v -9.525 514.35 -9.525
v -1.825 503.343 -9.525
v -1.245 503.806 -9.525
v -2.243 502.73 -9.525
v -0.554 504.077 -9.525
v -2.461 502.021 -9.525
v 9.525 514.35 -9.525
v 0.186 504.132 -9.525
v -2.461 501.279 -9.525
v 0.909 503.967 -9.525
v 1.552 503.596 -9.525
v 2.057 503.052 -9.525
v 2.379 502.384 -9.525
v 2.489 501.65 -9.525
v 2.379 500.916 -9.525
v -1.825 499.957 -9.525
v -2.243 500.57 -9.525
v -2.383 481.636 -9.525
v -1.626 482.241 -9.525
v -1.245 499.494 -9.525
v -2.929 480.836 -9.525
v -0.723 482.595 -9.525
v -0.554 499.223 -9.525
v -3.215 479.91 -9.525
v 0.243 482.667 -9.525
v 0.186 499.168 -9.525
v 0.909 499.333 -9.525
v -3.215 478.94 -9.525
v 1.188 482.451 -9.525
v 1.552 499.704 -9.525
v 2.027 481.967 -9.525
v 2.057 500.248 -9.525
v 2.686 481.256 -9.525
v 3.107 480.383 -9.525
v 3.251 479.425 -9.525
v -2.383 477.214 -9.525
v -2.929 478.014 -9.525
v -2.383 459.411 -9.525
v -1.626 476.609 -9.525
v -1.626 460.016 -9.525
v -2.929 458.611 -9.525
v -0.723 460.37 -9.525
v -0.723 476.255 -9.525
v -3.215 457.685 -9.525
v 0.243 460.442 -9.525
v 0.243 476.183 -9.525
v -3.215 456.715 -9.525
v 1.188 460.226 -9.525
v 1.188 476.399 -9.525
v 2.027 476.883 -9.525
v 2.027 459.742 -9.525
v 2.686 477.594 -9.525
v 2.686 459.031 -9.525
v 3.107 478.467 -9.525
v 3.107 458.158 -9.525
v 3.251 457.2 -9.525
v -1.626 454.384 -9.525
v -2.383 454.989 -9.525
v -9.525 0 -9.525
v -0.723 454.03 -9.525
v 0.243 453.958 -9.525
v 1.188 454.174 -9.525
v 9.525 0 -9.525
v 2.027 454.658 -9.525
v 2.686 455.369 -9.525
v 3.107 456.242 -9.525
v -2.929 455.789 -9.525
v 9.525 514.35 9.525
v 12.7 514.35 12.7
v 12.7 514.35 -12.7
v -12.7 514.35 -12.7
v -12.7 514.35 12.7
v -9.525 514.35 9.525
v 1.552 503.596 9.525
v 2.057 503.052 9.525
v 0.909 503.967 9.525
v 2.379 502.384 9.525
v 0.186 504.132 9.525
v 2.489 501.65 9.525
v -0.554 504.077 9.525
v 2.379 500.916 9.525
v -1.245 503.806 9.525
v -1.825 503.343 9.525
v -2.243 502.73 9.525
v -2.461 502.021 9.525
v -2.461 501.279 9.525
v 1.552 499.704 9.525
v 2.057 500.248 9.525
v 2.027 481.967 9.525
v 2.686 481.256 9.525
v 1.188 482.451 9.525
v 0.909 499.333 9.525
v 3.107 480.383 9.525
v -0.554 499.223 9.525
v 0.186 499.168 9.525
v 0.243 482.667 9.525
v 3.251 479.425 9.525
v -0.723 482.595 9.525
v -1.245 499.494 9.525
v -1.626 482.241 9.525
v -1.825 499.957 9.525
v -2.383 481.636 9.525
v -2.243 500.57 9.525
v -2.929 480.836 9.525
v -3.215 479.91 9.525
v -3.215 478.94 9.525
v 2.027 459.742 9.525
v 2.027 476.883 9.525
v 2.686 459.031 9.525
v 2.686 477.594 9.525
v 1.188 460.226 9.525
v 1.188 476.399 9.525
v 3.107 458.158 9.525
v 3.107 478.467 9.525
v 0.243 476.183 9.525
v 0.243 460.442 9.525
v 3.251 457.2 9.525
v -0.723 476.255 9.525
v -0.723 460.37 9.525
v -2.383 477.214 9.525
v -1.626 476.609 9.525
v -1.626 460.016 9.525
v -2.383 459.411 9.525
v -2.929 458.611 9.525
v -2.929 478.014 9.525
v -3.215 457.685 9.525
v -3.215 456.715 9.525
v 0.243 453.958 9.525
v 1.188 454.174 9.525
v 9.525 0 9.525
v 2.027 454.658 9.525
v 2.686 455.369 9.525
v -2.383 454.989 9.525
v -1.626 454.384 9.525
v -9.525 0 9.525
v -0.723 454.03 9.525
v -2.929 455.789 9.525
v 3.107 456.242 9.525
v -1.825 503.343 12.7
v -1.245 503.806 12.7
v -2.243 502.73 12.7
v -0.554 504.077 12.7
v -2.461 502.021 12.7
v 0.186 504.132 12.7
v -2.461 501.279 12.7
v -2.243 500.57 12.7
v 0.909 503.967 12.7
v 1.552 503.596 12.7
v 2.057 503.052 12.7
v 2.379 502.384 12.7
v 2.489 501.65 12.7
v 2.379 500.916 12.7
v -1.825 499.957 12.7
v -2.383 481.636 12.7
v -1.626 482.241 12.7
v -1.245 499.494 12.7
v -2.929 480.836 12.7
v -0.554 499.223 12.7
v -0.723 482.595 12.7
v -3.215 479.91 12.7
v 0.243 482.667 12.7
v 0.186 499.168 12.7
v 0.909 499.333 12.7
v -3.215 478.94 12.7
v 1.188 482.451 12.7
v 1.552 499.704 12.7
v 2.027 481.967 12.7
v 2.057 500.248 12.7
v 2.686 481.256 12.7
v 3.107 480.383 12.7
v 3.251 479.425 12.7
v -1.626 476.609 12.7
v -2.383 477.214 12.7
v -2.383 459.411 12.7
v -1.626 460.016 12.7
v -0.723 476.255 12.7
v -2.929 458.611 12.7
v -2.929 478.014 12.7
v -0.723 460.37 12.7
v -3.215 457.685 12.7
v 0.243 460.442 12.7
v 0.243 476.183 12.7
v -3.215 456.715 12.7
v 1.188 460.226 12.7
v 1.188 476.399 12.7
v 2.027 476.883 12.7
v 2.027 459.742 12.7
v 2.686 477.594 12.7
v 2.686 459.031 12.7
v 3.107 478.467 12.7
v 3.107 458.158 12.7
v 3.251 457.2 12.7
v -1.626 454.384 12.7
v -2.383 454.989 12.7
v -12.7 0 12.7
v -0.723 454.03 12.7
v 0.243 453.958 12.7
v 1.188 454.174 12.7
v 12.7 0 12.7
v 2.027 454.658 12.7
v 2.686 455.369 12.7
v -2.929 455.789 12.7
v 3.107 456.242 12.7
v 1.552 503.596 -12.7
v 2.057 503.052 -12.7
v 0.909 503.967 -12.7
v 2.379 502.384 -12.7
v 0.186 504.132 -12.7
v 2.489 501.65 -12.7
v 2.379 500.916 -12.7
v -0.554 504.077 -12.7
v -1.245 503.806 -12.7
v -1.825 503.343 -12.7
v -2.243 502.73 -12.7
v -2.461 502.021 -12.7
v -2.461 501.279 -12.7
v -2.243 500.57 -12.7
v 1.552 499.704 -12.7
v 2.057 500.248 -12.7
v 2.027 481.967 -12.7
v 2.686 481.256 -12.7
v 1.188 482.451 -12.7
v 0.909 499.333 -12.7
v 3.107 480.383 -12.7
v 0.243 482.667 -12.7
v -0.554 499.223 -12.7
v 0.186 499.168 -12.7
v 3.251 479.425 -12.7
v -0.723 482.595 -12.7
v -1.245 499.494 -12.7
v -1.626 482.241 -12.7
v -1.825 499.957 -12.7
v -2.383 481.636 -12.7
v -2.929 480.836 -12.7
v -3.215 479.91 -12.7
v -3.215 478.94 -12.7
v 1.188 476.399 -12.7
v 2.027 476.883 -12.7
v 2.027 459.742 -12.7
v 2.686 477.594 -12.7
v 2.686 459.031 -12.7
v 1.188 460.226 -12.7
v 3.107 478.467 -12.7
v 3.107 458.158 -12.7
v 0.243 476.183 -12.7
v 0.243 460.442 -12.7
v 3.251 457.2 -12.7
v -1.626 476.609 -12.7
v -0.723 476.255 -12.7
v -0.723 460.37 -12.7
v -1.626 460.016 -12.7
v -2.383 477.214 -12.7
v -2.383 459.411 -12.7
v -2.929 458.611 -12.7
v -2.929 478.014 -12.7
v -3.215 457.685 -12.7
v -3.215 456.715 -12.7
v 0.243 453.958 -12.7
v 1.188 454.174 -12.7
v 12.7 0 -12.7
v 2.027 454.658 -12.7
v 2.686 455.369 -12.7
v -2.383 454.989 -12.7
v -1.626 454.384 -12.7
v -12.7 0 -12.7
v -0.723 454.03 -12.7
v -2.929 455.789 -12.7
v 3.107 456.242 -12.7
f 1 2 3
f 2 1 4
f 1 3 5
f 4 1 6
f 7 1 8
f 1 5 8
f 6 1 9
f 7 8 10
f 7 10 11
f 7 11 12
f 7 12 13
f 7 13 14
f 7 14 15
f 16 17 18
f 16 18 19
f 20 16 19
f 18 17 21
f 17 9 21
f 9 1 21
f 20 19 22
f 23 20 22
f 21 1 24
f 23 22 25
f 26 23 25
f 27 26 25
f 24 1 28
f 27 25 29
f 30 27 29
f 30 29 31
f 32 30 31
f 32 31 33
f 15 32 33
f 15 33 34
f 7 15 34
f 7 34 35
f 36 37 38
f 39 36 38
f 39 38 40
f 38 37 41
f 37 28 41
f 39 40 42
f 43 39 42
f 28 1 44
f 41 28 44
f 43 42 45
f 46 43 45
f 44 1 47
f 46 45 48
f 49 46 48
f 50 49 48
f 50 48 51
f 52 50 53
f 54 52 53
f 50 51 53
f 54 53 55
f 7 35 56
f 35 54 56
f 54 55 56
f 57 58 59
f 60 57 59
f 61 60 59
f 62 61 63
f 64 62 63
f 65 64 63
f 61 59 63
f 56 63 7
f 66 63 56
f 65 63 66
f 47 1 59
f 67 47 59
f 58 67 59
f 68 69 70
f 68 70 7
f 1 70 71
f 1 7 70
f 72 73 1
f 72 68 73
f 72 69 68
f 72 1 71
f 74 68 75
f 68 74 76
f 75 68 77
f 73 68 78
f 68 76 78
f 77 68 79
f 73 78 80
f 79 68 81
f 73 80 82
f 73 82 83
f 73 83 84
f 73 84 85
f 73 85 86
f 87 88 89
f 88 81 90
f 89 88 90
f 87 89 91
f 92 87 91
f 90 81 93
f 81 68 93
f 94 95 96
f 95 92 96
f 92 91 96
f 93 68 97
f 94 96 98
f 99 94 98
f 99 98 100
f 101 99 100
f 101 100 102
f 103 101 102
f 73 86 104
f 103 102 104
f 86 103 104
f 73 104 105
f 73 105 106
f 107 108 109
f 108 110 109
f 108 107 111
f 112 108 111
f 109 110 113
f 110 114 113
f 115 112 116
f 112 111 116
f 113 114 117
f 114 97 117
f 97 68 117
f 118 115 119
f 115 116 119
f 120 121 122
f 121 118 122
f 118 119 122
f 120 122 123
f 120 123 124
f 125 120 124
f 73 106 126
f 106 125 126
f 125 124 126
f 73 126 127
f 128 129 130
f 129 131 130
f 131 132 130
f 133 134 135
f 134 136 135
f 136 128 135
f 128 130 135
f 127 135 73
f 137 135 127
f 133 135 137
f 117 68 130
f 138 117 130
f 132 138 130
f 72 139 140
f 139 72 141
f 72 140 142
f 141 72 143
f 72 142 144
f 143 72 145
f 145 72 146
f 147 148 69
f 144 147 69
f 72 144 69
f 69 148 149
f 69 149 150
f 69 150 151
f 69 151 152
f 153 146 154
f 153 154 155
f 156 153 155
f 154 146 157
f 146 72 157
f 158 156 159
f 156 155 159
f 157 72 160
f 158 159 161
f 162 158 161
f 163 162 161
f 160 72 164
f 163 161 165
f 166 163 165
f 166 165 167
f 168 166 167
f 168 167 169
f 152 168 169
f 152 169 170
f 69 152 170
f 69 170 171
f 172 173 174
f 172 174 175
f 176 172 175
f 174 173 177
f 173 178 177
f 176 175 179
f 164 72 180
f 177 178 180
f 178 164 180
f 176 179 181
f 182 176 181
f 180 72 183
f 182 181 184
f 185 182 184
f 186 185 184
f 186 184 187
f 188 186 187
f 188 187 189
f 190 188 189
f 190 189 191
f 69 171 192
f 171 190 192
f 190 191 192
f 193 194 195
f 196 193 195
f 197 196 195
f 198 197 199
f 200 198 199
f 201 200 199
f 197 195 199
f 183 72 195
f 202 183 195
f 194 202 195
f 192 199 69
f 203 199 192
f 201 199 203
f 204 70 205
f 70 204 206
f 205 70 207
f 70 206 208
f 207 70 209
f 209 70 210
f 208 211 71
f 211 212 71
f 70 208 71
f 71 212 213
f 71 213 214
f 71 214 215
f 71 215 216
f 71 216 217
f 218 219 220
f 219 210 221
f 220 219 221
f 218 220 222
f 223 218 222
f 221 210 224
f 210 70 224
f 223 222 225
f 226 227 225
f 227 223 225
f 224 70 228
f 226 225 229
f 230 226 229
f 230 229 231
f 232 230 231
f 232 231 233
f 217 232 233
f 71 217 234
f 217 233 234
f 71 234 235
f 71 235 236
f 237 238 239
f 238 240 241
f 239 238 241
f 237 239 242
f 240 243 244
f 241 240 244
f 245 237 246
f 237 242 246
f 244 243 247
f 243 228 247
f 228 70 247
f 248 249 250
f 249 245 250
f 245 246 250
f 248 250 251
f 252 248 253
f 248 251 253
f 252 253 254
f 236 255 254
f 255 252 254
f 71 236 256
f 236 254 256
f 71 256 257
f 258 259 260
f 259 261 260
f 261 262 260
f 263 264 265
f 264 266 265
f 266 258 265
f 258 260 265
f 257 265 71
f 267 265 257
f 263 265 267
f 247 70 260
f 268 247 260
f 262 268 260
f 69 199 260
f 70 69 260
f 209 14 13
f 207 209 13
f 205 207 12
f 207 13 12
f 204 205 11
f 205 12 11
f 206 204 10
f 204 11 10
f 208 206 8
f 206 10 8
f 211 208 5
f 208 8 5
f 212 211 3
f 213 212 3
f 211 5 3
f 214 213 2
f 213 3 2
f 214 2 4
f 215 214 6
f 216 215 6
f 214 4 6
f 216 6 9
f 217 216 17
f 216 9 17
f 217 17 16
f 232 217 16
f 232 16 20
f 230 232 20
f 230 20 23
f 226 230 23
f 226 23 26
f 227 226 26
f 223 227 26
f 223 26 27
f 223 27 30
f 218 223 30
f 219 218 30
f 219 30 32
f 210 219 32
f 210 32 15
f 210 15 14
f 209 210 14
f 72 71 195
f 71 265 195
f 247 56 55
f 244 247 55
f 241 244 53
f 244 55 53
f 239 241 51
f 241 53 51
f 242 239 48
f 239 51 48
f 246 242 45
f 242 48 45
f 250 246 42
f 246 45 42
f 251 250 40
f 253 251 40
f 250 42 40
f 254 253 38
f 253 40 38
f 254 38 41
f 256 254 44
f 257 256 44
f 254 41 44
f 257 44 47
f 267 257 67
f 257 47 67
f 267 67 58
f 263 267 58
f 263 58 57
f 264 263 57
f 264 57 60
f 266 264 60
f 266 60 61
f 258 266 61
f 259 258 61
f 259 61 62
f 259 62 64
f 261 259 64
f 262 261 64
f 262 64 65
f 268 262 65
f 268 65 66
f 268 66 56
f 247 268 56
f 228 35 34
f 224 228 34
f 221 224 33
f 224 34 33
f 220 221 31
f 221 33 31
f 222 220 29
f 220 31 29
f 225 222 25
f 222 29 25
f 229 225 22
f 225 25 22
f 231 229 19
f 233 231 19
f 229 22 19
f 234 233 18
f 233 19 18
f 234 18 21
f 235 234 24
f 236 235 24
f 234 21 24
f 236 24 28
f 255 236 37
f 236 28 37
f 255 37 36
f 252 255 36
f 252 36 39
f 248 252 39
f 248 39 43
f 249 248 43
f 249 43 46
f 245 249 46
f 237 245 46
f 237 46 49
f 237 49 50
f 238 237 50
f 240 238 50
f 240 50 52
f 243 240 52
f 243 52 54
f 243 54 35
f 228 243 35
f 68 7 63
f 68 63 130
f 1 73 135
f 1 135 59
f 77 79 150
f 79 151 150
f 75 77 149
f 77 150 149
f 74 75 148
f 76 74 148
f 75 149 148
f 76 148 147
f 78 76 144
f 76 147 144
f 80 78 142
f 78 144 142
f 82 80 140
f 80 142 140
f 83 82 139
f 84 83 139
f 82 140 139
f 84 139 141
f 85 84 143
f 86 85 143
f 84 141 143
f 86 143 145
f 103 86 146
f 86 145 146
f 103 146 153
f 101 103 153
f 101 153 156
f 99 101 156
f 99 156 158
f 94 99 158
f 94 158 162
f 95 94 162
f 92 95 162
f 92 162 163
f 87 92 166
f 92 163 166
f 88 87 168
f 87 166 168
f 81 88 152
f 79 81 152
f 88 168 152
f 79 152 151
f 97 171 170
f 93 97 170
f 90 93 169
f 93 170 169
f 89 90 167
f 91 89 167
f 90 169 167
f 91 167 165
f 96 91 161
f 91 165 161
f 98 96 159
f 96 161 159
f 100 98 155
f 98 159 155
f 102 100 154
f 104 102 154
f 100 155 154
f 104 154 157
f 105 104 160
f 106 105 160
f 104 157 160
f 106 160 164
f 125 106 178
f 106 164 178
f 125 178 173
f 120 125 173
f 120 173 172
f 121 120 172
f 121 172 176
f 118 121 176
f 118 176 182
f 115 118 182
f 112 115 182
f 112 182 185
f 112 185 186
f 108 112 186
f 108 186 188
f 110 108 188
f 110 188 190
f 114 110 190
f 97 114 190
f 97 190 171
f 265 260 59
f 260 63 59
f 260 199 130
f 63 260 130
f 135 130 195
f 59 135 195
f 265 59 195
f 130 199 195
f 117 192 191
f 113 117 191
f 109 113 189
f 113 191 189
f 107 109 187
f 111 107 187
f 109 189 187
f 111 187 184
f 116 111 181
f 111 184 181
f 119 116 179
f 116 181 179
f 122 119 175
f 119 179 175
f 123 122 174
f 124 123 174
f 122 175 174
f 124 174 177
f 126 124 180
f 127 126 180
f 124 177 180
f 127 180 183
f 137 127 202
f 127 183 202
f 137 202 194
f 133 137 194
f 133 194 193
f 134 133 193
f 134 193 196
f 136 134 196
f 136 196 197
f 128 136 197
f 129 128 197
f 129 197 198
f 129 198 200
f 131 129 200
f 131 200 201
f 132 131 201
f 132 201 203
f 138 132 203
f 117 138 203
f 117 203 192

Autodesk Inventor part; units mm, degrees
ref_plane "YZ Plane" through (0, 0, 0) normal (1, 0, 0) x (0, 1, 0)
ref_plane "XZ Plane" through (0, 0, 0) normal (0, 1, 0) x (-1, 0, 0)
ref_plane "XY Plane" through (0, 0, 0) normal (0, 0, 1) x (1, 0, 0)
sketch "Sketch1" plane through (0, 0, 0) normal (0, 1, 0) x (-1, 0, 0)
  line L0 (-12.7, -12.7) -> (12.7, -12.7)
  line L1 (12.7, -12.7) -> (12.7, 12.7)
  line L2 (12.7, 12.7) -> (-12.7, 12.7)
  line L3 (-12.7, 12.7) -> (-12.7, -12.7)
  line L4 (-12.7, -12.7) -> (12.7, 12.7) construction
  line L5 (12.7, -12.7) -> (-12.7, 12.7) construction
  line L6 (9.525, 9.525) -> (9.525, -9.525)
  line L7 (9.525, -9.525) -> (-9.525, -9.525)
  line L8 (-9.525, -9.525) -> (-9.525, 9.525)
  line L9 (-9.525, 9.525) -> (9.525, 9.525)
  point P0 (0, 0)
  dimension "d0" = 25.4
  dimension "d1" = 25.4
  dimension "d2" = 3.175
extrude "Extrusion1" add sketch "Sketch1" along normal blind 514.35
sketch "Sketch2" plane through (-12.7, 0, 12.7) normal (0, 0, 1) x (1, 0, 0)
  line L0 (25.4, 488.95) -> (0, 488.95) construction
  line L1 (0, 488.95) -> (0, 514.35) construction
  line L2 (0, 514.35) -> (25.4, 514.35) construction
  line L3 (25.4, 514.35) -> (25.4, 488.95) construction
  line L4 (25.4, 488.95) -> (0, 514.35) construction
  line L5 (0, 488.95) -> (25.4, 514.35) construction
  circle A0 centre (12.7, 501.65) radius 2.4892
  circle A1 centre (12.7, 479.425) radius 3.2512
  circle A2 centre (12.7, 457.2) radius 3.2512
  point P0 (12.7, 0)
  dimension "d5" = 25.4
  dimension "d6" = 25.4
  dimension "d7" = 4.9784
  dimension "d10" = 22.225
  dimension "d11" = 22.225
  dimension "d12" = 6.5024
extrude "Extrusion2" cut sketch "Sketch2" against normal through all
properties part number "STRU_012_BilletPoleMiddle_Unique" material "Aluminum 6061"
